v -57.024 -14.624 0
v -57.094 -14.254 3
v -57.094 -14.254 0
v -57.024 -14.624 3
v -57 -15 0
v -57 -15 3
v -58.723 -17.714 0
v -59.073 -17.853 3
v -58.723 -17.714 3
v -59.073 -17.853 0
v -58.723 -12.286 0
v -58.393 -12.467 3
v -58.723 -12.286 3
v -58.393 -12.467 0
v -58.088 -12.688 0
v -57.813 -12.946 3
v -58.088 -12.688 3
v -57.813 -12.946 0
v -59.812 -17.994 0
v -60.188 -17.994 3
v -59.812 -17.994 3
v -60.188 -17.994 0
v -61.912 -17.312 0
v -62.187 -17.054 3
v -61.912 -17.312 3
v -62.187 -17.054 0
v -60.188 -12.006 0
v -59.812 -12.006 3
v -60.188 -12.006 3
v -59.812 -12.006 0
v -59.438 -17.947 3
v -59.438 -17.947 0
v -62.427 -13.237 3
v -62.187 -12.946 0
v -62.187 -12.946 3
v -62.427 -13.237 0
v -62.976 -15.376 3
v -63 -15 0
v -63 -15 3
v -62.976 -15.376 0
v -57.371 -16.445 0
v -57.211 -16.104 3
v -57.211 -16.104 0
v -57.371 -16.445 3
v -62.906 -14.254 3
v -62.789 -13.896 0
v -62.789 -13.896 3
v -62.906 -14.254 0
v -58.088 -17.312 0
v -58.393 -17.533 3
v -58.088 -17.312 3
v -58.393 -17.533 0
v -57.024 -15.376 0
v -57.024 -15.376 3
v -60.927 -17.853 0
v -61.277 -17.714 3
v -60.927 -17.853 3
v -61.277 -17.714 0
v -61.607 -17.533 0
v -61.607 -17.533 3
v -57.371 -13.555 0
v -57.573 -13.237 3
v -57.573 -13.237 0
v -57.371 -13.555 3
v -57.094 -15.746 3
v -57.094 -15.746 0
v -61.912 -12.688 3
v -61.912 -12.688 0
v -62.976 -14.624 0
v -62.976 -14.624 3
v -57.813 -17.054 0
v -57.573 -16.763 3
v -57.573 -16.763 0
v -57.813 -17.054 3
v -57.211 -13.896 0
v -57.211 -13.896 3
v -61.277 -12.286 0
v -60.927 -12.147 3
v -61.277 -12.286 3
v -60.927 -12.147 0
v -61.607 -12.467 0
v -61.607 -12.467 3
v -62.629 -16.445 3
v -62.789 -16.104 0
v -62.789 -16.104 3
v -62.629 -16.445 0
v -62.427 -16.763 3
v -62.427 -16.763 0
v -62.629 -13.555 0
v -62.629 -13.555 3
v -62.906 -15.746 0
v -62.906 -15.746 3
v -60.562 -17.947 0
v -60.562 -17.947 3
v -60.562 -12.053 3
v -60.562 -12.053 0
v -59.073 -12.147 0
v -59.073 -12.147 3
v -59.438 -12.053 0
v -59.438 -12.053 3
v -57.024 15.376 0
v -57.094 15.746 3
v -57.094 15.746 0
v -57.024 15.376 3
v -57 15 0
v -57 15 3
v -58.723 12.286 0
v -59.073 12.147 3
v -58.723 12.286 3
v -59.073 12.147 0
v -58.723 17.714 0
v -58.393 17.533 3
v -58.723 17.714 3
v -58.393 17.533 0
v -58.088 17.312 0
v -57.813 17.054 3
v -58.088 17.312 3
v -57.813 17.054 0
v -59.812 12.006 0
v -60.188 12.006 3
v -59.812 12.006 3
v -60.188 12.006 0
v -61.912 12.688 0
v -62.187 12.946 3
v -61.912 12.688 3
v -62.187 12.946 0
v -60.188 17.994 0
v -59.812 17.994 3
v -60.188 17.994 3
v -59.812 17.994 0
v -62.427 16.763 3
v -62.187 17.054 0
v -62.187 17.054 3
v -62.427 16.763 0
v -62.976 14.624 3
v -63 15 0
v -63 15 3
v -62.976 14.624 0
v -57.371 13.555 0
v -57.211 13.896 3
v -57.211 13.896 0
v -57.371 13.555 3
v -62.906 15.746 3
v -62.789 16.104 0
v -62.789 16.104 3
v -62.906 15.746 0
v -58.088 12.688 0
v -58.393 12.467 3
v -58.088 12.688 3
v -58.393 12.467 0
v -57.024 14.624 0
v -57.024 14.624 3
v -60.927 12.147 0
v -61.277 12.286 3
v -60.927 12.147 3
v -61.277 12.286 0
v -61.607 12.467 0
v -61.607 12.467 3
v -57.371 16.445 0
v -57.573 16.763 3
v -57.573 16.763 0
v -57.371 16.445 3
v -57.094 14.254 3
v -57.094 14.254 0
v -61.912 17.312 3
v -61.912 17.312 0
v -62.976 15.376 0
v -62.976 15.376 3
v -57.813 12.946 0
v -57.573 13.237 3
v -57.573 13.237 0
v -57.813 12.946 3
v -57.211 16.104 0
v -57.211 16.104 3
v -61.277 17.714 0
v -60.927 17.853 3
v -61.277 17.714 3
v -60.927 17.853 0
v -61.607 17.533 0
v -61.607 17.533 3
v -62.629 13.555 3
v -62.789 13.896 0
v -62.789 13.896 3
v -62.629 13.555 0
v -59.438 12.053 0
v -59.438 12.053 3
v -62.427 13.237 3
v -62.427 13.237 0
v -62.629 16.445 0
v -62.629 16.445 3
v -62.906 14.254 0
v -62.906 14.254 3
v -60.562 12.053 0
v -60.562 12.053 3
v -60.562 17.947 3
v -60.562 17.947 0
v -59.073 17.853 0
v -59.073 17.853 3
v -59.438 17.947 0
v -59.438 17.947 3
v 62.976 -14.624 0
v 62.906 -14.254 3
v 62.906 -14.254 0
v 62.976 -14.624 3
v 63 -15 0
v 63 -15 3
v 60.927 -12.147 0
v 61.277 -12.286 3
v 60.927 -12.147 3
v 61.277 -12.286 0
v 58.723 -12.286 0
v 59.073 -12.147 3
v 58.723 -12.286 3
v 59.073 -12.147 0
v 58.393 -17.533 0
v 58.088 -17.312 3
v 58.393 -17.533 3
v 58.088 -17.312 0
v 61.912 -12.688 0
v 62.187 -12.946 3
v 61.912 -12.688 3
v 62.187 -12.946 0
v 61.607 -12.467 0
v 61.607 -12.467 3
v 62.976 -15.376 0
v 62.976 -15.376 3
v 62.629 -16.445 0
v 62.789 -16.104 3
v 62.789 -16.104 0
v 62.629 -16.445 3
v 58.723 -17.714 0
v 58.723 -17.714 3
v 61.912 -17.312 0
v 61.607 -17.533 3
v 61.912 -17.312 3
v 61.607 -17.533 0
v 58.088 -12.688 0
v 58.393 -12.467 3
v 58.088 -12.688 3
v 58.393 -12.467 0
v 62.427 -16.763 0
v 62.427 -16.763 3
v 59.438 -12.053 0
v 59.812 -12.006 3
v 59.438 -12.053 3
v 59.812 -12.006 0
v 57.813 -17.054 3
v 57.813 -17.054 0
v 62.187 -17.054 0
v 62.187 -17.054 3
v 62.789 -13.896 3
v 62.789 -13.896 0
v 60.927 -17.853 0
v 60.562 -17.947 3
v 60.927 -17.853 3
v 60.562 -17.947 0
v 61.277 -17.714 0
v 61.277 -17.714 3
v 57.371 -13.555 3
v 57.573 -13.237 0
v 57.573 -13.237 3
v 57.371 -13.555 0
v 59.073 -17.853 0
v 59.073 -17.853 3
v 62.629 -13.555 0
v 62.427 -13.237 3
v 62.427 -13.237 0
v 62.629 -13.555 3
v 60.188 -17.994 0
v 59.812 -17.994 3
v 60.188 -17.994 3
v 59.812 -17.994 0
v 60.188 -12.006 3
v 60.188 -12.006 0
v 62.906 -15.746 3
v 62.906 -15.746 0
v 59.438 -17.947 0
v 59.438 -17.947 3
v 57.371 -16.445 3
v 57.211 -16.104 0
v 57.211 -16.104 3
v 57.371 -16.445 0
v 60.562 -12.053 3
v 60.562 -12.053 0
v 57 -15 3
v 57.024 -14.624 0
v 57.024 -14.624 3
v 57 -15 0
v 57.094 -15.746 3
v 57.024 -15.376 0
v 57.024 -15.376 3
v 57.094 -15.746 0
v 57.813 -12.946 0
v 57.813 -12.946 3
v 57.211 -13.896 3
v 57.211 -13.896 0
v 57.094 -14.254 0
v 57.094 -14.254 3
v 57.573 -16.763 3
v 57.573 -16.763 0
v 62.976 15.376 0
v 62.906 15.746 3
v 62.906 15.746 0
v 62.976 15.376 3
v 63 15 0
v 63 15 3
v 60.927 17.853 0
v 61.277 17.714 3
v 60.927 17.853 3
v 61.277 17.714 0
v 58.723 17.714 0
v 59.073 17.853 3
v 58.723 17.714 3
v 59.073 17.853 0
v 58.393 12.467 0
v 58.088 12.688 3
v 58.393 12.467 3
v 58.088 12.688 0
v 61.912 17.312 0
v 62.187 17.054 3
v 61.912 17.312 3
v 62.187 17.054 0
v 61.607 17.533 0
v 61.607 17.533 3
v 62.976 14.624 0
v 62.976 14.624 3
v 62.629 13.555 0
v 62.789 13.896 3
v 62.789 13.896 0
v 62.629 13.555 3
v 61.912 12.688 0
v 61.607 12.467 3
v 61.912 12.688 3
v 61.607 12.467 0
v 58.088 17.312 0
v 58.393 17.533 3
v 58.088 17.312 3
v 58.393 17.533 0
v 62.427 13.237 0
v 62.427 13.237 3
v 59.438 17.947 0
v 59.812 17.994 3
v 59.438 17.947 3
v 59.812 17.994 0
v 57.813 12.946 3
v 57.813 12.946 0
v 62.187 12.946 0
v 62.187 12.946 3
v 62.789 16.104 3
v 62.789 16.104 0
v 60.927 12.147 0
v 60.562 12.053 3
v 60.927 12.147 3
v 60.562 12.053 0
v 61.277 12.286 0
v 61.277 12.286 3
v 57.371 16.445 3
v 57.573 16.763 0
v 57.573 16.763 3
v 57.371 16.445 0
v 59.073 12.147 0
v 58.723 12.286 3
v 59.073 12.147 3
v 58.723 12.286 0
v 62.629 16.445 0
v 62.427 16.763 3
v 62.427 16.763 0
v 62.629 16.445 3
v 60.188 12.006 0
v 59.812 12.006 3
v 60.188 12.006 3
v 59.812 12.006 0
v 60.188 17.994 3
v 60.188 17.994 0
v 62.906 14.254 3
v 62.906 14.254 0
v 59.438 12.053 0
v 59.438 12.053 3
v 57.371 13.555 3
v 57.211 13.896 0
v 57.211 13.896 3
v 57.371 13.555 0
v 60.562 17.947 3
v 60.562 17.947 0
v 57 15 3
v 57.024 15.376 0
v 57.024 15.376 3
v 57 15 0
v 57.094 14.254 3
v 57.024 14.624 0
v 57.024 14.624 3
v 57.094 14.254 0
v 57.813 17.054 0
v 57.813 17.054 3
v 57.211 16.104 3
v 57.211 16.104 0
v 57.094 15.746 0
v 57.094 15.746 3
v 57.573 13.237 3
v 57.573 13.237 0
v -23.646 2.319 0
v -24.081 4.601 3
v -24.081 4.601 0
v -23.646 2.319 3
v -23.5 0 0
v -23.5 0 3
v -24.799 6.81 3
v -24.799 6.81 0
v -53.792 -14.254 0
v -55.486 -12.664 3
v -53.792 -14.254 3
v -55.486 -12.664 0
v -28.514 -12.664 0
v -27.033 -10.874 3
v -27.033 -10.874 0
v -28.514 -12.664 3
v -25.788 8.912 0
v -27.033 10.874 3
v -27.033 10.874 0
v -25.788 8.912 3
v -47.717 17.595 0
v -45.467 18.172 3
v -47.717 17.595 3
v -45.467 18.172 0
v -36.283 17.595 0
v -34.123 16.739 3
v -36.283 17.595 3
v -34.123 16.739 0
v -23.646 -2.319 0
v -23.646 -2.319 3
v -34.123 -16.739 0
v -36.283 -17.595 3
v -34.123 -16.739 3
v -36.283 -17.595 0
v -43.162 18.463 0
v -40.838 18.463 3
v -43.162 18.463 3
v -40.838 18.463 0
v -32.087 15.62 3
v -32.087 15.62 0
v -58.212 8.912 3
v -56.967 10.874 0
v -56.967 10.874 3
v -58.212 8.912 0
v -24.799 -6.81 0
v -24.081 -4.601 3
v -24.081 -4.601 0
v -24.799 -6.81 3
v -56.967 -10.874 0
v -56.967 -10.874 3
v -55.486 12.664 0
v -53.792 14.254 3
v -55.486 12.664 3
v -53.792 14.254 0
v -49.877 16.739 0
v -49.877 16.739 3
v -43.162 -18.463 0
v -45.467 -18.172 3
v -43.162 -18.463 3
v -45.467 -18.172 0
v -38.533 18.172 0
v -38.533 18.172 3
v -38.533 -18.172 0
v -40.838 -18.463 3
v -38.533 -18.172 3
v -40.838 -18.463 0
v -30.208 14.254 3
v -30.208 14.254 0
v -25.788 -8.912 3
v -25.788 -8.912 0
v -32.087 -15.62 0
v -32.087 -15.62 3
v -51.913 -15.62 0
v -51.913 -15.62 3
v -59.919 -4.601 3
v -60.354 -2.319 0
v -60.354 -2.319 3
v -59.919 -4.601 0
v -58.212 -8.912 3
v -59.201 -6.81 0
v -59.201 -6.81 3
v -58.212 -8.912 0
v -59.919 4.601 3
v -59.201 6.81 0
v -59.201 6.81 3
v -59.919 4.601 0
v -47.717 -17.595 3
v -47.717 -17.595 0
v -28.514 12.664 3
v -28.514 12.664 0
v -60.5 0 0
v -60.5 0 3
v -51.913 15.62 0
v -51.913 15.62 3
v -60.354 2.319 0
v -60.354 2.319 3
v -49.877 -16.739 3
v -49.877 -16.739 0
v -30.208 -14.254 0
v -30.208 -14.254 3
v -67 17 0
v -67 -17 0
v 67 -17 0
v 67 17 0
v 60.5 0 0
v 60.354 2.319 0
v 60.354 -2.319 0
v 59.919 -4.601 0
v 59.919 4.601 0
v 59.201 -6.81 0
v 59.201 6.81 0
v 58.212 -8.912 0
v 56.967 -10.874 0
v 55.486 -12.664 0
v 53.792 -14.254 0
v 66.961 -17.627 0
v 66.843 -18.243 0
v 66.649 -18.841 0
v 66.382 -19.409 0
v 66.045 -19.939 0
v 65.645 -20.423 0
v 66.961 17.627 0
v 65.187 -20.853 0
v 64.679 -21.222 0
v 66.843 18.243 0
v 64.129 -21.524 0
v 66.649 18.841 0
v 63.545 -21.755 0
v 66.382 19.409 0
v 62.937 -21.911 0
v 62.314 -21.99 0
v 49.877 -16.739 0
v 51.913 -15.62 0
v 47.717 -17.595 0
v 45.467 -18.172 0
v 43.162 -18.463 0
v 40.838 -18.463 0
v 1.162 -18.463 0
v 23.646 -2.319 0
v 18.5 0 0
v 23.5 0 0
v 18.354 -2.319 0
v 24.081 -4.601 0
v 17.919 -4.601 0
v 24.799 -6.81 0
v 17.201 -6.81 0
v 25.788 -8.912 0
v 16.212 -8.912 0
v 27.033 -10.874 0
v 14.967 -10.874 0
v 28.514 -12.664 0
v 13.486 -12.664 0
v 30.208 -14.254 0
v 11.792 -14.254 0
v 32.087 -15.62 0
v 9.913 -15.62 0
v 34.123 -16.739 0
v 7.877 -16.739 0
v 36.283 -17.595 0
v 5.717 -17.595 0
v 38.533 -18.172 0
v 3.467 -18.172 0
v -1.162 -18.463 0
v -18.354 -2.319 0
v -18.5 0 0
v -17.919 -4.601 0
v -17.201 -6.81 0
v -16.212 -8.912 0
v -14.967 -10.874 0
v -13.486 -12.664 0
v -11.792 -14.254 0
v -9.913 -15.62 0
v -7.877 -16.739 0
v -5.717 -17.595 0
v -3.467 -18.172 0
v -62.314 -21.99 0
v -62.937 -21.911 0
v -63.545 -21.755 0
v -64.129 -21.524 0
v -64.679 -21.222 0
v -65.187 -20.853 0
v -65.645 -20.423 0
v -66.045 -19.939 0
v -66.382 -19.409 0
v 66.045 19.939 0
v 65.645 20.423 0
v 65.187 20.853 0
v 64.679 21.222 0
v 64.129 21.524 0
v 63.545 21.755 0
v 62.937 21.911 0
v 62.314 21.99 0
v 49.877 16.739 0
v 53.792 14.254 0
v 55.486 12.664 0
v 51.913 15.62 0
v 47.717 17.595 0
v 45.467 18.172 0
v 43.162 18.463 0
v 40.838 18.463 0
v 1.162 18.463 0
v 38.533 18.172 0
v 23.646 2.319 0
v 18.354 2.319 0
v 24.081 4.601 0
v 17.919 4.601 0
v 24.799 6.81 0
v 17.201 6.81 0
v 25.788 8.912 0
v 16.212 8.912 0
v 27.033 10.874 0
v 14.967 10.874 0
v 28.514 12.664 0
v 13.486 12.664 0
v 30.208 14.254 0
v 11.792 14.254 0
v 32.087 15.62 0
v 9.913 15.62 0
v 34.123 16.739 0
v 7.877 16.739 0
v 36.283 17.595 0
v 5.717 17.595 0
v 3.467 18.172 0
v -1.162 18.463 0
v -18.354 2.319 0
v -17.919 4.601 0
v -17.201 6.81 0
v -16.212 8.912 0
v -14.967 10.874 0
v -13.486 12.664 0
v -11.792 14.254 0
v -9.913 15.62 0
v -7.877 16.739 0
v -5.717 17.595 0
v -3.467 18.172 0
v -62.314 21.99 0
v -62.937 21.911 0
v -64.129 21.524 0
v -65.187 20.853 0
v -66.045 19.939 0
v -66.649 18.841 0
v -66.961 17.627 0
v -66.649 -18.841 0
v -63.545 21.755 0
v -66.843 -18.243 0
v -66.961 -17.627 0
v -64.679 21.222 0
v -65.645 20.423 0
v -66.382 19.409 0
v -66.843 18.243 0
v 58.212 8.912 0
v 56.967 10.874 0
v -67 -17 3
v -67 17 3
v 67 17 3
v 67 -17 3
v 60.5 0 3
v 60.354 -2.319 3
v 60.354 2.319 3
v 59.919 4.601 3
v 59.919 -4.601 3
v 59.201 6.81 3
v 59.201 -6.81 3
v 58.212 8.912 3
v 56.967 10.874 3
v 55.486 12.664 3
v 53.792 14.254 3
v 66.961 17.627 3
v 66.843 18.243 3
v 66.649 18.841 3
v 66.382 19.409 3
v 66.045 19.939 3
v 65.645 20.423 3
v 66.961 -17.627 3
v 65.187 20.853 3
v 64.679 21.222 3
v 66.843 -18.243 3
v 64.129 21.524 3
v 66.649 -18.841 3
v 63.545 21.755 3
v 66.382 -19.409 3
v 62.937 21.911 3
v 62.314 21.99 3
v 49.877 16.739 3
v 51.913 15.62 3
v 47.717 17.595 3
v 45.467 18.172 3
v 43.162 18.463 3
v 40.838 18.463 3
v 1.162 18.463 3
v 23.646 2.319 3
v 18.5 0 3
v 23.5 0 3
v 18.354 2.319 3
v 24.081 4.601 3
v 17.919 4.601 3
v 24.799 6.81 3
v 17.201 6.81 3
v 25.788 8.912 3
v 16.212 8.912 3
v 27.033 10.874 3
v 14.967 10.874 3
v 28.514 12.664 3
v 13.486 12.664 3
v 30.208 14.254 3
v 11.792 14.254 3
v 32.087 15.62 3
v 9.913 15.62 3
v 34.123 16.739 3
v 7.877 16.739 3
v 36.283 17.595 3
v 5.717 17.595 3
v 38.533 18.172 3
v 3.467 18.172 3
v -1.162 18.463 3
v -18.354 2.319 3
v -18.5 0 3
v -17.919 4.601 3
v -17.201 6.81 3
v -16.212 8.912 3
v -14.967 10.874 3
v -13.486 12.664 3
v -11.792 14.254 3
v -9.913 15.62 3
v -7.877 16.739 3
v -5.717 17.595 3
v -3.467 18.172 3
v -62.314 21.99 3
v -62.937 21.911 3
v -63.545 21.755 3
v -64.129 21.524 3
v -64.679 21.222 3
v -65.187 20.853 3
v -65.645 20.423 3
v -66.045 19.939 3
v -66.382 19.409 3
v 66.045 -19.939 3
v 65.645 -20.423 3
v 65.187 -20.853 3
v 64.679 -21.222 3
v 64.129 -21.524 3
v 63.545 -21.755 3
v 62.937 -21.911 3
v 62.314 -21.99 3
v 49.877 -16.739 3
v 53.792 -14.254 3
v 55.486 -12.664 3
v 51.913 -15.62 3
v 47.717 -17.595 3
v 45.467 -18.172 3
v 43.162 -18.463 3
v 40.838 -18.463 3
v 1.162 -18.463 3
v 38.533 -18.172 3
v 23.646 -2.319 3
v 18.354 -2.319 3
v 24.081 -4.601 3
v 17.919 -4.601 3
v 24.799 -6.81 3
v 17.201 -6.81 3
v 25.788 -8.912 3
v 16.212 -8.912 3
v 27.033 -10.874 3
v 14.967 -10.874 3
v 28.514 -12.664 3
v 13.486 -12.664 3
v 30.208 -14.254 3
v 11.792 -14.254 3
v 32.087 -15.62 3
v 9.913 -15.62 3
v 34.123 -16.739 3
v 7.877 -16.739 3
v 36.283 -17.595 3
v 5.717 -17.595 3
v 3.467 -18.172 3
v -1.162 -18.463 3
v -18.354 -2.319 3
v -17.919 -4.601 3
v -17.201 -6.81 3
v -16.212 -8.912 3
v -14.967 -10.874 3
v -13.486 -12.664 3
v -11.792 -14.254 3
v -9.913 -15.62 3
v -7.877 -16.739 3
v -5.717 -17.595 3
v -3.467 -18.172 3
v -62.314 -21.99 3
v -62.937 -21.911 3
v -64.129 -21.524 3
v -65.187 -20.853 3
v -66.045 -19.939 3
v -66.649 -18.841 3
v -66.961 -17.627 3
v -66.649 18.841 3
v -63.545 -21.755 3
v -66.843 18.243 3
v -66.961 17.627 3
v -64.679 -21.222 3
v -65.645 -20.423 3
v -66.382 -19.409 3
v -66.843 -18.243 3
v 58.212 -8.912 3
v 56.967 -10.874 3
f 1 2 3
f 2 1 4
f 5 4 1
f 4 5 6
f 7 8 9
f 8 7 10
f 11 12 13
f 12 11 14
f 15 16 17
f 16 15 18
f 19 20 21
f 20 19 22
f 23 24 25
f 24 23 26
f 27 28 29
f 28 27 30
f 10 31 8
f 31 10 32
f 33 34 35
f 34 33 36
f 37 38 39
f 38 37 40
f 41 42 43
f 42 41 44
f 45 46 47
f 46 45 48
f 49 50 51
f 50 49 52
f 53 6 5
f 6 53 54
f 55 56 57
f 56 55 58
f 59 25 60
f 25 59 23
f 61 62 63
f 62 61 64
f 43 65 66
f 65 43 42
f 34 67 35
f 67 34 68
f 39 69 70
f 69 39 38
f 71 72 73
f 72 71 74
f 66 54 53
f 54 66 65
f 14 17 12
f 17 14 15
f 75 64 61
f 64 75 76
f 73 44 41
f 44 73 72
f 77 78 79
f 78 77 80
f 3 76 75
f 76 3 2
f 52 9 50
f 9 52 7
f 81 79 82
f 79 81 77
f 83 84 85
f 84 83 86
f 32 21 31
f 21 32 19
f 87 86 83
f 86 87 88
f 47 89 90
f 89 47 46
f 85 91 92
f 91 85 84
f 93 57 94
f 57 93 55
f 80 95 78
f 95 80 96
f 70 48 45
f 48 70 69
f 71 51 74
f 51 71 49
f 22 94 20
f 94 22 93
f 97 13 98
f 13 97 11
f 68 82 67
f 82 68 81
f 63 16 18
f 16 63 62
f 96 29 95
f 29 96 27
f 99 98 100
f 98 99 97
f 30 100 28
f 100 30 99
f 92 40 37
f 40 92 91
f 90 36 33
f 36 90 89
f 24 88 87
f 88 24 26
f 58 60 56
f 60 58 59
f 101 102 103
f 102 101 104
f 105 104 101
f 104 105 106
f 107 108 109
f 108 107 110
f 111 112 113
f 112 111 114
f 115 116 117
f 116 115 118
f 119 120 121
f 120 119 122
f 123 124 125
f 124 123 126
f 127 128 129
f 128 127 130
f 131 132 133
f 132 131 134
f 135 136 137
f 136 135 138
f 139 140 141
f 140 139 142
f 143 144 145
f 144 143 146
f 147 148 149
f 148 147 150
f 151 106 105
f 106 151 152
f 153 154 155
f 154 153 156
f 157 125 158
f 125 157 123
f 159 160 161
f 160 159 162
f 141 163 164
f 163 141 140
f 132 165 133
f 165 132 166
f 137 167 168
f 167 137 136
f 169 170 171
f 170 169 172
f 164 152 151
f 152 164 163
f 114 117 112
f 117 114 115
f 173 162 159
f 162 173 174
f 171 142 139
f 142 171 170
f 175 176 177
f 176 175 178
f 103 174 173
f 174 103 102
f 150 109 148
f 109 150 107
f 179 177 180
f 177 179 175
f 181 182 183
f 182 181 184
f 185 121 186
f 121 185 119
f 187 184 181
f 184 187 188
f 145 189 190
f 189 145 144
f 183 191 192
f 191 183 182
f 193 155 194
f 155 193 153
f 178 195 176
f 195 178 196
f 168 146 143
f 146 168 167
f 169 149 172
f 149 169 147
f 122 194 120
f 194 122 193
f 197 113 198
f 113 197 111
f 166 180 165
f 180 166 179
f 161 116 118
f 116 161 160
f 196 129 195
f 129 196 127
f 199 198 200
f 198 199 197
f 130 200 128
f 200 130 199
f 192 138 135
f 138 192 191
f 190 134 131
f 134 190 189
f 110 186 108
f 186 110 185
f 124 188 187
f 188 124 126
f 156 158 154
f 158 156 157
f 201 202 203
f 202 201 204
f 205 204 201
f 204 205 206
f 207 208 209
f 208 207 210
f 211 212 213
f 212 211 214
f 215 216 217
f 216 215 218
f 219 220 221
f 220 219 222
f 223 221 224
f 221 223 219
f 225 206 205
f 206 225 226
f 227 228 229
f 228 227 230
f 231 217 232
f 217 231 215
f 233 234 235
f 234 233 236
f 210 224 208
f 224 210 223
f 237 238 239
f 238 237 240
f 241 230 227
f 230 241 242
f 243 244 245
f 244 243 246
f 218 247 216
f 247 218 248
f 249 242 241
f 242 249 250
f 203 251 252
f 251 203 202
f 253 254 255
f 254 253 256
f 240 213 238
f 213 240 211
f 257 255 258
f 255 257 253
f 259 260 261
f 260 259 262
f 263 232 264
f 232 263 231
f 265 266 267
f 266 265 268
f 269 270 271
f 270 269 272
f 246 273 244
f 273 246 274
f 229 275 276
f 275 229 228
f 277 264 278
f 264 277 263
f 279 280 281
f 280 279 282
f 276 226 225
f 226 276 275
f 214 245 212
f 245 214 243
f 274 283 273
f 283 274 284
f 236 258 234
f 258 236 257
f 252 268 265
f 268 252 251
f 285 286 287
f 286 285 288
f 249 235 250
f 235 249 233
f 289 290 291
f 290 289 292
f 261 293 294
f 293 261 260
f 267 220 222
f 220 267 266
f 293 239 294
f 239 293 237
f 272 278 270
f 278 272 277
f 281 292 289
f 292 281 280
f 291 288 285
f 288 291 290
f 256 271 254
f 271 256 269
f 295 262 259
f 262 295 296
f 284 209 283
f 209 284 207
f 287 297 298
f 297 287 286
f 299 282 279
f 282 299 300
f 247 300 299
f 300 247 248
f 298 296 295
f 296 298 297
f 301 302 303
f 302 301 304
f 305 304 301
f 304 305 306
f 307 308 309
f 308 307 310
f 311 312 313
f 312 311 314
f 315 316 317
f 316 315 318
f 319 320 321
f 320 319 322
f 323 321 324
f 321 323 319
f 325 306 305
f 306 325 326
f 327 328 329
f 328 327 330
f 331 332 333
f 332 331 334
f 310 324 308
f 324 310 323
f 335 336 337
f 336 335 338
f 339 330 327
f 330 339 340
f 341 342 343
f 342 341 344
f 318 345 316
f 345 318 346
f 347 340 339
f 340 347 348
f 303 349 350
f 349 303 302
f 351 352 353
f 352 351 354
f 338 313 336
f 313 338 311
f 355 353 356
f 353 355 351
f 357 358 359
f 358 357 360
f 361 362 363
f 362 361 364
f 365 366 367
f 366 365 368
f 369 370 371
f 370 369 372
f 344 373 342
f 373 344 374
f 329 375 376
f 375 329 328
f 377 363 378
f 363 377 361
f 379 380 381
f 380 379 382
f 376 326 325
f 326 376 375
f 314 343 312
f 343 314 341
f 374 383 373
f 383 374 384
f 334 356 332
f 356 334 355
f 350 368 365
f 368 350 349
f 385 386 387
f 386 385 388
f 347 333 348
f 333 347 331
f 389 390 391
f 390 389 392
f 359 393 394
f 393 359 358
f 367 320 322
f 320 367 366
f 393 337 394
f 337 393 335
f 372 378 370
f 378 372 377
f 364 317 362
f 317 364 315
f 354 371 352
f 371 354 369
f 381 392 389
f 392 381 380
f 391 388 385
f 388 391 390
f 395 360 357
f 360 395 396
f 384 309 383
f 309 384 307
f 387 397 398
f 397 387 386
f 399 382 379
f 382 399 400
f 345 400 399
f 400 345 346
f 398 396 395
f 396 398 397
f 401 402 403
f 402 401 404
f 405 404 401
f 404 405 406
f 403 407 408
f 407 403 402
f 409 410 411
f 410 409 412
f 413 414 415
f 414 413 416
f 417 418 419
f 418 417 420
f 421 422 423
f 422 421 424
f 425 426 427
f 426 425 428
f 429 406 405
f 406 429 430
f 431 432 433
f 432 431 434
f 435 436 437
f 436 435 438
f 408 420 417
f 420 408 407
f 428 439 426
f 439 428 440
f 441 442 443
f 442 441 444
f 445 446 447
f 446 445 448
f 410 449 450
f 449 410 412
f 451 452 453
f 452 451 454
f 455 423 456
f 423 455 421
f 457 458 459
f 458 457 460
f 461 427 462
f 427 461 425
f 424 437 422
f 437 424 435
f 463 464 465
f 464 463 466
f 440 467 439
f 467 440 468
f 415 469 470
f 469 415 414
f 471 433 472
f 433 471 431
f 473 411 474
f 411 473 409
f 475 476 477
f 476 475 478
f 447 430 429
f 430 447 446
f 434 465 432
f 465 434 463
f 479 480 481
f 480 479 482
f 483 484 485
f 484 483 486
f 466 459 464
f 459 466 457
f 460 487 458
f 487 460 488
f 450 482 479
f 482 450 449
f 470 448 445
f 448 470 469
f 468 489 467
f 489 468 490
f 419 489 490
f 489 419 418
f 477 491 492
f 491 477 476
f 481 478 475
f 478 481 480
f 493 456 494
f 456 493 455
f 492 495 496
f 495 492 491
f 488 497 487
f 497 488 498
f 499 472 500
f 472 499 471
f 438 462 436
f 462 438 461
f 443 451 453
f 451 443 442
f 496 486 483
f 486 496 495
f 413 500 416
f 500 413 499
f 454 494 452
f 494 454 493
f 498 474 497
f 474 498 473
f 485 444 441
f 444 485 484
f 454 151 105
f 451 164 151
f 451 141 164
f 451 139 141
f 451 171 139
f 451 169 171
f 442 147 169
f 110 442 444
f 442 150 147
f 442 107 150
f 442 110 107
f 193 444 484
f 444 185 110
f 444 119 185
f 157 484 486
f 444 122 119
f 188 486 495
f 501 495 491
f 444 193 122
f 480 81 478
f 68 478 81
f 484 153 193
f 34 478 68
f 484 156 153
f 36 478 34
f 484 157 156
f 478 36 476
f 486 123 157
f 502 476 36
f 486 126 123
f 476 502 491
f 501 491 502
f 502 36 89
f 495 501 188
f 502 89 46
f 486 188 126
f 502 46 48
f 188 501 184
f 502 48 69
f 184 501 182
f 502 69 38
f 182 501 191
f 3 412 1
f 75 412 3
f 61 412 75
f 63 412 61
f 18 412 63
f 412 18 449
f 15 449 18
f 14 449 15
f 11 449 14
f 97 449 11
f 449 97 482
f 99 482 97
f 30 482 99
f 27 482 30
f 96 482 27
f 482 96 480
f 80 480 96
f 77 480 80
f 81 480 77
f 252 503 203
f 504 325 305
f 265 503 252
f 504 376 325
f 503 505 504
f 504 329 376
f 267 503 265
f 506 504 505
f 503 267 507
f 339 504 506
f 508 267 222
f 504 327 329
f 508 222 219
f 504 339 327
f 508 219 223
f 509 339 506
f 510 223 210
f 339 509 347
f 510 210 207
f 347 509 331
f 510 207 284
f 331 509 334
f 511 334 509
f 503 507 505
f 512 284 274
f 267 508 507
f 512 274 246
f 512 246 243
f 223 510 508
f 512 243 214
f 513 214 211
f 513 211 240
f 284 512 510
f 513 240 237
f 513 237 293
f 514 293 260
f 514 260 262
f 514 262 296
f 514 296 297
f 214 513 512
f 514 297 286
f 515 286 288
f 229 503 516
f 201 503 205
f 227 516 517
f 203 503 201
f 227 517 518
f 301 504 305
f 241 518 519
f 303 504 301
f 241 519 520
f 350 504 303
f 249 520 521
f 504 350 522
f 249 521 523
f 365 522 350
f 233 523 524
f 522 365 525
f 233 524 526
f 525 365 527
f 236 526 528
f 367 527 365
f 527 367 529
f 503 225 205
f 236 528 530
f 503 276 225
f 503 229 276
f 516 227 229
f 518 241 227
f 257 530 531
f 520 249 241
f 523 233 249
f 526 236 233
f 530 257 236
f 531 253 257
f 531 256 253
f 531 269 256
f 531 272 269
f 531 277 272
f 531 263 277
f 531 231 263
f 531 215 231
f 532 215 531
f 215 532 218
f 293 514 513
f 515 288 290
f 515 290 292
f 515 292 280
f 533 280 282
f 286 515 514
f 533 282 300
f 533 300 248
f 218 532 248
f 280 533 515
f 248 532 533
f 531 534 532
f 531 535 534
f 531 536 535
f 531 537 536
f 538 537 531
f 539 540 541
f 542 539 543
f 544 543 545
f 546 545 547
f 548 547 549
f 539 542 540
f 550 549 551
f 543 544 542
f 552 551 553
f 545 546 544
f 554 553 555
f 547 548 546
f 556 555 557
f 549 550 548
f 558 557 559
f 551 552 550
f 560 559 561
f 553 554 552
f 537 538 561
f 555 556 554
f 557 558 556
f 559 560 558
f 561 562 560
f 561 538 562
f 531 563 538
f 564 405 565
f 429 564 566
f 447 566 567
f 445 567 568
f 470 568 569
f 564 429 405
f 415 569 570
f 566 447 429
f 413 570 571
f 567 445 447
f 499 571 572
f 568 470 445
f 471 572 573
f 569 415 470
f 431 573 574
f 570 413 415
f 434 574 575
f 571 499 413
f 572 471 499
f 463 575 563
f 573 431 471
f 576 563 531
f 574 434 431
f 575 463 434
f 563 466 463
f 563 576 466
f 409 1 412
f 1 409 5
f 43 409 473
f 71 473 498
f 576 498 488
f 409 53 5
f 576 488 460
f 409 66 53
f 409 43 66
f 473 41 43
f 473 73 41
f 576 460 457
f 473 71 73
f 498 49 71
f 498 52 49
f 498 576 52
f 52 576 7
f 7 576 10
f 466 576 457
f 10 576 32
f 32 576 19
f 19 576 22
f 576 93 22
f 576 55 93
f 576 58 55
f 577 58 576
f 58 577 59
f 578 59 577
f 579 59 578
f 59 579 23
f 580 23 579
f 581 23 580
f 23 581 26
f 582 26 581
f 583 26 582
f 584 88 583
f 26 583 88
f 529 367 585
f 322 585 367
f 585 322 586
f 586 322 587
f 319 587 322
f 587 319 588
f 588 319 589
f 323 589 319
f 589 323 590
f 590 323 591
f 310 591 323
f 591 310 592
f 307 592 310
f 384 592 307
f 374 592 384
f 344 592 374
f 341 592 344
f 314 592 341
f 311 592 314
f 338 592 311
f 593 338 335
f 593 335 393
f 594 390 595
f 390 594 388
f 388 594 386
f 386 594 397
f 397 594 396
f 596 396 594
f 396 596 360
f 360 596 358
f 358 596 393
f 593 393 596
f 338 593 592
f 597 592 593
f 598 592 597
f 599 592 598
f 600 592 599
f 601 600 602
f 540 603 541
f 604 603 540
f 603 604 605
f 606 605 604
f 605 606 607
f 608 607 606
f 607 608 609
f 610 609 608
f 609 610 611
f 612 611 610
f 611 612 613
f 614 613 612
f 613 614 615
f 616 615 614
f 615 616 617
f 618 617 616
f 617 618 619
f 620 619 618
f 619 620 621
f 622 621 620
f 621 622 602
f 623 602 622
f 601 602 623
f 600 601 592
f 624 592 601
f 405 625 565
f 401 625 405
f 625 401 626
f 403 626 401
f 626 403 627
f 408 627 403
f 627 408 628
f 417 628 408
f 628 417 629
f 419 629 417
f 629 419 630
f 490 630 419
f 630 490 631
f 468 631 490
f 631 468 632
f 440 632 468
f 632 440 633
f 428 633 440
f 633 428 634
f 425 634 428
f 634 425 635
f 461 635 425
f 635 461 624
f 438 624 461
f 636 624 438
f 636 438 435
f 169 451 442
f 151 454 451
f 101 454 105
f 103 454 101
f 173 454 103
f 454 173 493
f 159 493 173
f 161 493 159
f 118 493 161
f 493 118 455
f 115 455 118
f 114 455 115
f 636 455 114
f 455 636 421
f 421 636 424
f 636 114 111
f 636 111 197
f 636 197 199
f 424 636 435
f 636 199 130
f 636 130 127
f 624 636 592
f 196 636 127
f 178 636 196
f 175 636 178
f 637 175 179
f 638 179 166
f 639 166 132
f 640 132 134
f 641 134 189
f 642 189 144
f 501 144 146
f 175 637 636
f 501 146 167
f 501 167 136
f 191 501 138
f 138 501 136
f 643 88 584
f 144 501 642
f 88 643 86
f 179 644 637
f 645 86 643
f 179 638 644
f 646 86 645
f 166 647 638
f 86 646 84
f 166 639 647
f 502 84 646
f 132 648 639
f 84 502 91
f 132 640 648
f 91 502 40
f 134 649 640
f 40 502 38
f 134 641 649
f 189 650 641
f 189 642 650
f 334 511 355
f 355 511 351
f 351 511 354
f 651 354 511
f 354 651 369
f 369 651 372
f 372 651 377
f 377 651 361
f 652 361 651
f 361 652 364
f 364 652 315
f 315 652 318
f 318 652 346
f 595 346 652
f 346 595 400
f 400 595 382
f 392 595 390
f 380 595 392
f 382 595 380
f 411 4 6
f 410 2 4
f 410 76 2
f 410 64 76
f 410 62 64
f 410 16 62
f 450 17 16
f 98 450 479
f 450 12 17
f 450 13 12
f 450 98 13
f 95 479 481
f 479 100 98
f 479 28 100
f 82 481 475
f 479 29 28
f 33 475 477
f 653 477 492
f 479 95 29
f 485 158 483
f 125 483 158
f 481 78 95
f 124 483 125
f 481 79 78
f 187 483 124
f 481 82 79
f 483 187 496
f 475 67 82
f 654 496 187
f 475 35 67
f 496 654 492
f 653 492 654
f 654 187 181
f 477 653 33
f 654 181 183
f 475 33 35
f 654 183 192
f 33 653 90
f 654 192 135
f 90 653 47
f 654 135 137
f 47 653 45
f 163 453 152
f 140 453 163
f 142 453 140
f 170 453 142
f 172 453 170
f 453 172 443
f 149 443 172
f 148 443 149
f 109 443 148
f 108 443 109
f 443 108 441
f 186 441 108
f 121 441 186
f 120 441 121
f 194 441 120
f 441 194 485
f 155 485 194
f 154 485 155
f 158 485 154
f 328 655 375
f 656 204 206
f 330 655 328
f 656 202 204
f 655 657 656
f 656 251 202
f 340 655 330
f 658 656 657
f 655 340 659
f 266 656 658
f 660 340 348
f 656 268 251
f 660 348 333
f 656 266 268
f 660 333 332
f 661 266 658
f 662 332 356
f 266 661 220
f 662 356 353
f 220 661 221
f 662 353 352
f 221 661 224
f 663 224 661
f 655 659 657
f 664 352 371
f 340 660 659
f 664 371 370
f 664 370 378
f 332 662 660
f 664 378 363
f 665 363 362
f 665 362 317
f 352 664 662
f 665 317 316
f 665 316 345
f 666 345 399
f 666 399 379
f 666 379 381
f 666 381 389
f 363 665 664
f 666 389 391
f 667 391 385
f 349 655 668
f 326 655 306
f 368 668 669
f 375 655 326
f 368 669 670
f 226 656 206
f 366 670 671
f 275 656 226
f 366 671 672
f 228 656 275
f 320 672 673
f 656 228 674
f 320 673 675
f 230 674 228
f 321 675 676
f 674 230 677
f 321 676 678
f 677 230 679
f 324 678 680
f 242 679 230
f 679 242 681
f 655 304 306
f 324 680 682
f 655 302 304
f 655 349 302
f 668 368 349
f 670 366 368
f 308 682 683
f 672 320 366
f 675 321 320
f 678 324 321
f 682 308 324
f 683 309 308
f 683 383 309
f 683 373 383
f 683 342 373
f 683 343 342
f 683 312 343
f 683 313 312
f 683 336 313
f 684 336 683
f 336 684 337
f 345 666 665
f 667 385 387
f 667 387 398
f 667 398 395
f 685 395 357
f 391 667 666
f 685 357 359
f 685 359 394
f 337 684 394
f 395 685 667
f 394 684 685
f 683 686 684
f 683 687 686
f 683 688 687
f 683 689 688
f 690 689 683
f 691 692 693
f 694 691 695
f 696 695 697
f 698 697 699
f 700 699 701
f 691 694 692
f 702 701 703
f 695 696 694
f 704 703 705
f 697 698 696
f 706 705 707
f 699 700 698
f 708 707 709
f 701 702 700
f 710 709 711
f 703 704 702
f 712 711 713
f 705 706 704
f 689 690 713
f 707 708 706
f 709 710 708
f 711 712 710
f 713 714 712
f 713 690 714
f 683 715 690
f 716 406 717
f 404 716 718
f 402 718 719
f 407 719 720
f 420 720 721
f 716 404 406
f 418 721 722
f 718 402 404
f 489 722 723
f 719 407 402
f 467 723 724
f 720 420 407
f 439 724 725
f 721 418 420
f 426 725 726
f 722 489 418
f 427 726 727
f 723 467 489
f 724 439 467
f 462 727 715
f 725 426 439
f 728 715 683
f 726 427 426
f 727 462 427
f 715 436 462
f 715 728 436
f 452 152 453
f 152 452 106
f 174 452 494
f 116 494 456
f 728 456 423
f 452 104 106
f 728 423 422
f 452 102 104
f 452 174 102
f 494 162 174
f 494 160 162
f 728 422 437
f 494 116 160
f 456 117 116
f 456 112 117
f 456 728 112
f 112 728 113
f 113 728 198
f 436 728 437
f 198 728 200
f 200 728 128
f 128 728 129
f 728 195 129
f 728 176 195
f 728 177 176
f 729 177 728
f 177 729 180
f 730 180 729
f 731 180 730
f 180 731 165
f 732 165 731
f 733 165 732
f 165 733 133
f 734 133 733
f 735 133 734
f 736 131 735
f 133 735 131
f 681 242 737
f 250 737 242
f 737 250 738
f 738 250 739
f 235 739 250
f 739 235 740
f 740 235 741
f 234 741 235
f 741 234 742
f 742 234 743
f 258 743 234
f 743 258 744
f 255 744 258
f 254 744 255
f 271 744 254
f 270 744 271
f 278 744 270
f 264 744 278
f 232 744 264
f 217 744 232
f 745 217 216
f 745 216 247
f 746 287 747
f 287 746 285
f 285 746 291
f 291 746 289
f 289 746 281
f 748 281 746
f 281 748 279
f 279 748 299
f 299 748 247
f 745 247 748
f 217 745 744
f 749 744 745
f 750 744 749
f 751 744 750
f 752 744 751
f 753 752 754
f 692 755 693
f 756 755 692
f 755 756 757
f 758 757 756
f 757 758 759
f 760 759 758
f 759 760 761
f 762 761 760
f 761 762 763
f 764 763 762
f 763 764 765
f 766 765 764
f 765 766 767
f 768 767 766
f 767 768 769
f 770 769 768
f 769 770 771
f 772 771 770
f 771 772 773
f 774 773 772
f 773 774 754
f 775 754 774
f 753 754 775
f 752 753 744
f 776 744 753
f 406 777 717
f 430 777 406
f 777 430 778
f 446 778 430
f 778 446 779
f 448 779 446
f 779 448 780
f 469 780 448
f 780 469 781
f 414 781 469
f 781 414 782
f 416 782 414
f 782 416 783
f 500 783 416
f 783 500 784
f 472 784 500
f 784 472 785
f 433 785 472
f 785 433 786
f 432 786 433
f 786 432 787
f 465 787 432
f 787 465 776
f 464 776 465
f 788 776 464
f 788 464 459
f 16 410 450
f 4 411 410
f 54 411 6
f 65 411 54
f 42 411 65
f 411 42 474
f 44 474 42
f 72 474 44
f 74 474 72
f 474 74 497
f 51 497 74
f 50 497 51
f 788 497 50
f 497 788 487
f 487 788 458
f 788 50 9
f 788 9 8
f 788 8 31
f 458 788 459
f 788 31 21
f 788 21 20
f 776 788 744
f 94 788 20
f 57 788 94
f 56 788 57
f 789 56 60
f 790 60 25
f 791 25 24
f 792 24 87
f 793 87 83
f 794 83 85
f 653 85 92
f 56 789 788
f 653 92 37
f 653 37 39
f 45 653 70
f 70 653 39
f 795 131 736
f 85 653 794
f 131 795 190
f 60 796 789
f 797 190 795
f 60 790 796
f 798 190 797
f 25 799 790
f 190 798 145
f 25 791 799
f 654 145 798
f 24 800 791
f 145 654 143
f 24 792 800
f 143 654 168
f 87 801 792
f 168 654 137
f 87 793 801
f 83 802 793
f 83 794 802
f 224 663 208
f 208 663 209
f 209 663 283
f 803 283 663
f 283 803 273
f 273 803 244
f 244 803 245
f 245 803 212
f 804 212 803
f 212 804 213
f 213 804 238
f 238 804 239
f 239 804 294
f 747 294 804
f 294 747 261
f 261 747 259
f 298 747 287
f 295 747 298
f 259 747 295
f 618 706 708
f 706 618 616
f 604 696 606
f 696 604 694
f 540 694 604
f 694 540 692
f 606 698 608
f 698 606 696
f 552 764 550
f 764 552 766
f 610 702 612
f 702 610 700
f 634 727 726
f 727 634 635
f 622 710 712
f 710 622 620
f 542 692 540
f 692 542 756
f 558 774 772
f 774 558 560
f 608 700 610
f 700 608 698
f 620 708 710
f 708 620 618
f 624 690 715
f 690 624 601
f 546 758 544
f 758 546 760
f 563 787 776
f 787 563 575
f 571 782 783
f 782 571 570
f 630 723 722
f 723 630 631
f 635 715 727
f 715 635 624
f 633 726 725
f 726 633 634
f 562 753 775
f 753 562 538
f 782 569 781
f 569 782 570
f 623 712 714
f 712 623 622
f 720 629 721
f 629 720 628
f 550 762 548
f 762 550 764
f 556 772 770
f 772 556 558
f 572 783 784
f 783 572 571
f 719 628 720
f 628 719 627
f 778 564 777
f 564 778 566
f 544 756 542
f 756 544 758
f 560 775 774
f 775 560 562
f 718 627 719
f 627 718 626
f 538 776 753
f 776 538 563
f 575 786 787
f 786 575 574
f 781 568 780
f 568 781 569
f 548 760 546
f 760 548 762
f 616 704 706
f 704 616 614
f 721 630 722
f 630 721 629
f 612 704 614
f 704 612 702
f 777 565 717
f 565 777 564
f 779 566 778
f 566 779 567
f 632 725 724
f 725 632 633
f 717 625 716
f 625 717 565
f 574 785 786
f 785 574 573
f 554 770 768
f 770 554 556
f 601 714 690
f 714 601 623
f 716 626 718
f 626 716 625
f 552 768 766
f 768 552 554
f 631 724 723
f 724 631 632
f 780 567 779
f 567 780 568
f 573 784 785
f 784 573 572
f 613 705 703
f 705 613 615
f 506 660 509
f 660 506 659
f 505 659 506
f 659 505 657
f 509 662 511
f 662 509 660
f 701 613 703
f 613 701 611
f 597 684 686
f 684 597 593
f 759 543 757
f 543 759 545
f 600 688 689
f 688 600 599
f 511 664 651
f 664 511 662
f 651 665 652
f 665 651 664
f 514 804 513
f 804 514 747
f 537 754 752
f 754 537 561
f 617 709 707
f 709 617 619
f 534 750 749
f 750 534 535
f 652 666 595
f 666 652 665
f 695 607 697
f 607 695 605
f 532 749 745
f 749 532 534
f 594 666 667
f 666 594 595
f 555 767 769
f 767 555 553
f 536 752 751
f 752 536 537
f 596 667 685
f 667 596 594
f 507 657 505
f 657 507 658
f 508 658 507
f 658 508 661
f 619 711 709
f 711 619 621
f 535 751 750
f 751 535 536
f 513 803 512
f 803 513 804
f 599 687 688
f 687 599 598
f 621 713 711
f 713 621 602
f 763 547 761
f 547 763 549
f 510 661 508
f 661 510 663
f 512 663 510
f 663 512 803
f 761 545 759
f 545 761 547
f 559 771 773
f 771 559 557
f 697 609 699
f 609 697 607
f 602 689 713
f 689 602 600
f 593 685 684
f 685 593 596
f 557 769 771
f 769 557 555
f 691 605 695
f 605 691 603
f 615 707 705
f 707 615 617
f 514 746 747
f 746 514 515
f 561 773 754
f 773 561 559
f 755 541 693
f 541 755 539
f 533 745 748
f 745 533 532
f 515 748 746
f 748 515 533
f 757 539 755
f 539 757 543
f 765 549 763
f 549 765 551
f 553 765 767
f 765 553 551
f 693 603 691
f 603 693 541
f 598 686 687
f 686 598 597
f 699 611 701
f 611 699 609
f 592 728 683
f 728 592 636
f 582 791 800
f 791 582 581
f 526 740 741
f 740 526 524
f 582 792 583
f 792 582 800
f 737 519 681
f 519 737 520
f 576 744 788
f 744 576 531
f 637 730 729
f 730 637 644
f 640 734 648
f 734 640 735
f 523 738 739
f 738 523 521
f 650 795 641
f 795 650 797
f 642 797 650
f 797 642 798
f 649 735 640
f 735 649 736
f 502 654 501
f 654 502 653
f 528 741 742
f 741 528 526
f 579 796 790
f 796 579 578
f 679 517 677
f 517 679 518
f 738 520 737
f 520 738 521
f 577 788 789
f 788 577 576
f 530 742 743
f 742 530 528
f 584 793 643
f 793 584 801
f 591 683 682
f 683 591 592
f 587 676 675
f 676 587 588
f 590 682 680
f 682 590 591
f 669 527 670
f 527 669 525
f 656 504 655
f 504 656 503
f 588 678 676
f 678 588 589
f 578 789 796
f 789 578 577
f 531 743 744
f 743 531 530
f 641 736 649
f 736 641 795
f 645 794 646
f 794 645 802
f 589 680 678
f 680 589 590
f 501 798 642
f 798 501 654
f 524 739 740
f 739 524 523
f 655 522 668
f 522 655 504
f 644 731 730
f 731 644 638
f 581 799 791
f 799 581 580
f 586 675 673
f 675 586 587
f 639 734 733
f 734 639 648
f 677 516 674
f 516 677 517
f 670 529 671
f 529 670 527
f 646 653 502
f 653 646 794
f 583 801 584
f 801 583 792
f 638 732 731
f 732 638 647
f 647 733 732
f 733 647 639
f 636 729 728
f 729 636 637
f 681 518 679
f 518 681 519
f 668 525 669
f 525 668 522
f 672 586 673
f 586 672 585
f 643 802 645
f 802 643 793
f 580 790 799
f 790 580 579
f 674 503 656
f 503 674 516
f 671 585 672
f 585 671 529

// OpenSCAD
$fn = 50;


difference() {
	union() {
		hull() {
			translate(v = [-62.0000000000, 17.0000000000, 0]) {
				cylinder(h = 3, r = 5);
			}
			translate(v = [62.0000000000, 17.0000000000, 0]) {
				cylinder(h = 3, r = 5);
			}
			translate(v = [-62.0000000000, -17.0000000000, 0]) {
				cylinder(h = 3, r = 5);
			}
			translate(v = [62.0000000000, -17.0000000000, 0]) {
				cylinder(h = 3, r = 5);
			}
		}
	}
	union() {
		#translate(v = [-60.0000000000, -15.0000000000, -100.0000000000]) {
			cylinder(h = 200, r = 3.0000000000);
		}
		#translate(v = [-60.0000000000, 15.0000000000, -100.0000000000]) {
			cylinder(h = 200, r = 3.0000000000);
		}
		#translate(v = [60.0000000000, -15.0000000000, -100.0000000000]) {
			cylinder(h = 200, r = 3.0000000000);
		}
		#translate(v = [60.0000000000, 15.0000000000, -100.0000000000]) {
			cylinder(h = 200, r = 3.0000000000);
		}
		#translate(v = [-42.0000000000, 0, 0]) {
			cylinder(h = 3, r = 18.5000000000);
		}
		#cylinder(h = 3, r = 18.5000000000);
		#translate(v = [42.0000000000, 0, 0]) {
			cylinder(h = 3, r = 18.5000000000);
		}
	}
}
